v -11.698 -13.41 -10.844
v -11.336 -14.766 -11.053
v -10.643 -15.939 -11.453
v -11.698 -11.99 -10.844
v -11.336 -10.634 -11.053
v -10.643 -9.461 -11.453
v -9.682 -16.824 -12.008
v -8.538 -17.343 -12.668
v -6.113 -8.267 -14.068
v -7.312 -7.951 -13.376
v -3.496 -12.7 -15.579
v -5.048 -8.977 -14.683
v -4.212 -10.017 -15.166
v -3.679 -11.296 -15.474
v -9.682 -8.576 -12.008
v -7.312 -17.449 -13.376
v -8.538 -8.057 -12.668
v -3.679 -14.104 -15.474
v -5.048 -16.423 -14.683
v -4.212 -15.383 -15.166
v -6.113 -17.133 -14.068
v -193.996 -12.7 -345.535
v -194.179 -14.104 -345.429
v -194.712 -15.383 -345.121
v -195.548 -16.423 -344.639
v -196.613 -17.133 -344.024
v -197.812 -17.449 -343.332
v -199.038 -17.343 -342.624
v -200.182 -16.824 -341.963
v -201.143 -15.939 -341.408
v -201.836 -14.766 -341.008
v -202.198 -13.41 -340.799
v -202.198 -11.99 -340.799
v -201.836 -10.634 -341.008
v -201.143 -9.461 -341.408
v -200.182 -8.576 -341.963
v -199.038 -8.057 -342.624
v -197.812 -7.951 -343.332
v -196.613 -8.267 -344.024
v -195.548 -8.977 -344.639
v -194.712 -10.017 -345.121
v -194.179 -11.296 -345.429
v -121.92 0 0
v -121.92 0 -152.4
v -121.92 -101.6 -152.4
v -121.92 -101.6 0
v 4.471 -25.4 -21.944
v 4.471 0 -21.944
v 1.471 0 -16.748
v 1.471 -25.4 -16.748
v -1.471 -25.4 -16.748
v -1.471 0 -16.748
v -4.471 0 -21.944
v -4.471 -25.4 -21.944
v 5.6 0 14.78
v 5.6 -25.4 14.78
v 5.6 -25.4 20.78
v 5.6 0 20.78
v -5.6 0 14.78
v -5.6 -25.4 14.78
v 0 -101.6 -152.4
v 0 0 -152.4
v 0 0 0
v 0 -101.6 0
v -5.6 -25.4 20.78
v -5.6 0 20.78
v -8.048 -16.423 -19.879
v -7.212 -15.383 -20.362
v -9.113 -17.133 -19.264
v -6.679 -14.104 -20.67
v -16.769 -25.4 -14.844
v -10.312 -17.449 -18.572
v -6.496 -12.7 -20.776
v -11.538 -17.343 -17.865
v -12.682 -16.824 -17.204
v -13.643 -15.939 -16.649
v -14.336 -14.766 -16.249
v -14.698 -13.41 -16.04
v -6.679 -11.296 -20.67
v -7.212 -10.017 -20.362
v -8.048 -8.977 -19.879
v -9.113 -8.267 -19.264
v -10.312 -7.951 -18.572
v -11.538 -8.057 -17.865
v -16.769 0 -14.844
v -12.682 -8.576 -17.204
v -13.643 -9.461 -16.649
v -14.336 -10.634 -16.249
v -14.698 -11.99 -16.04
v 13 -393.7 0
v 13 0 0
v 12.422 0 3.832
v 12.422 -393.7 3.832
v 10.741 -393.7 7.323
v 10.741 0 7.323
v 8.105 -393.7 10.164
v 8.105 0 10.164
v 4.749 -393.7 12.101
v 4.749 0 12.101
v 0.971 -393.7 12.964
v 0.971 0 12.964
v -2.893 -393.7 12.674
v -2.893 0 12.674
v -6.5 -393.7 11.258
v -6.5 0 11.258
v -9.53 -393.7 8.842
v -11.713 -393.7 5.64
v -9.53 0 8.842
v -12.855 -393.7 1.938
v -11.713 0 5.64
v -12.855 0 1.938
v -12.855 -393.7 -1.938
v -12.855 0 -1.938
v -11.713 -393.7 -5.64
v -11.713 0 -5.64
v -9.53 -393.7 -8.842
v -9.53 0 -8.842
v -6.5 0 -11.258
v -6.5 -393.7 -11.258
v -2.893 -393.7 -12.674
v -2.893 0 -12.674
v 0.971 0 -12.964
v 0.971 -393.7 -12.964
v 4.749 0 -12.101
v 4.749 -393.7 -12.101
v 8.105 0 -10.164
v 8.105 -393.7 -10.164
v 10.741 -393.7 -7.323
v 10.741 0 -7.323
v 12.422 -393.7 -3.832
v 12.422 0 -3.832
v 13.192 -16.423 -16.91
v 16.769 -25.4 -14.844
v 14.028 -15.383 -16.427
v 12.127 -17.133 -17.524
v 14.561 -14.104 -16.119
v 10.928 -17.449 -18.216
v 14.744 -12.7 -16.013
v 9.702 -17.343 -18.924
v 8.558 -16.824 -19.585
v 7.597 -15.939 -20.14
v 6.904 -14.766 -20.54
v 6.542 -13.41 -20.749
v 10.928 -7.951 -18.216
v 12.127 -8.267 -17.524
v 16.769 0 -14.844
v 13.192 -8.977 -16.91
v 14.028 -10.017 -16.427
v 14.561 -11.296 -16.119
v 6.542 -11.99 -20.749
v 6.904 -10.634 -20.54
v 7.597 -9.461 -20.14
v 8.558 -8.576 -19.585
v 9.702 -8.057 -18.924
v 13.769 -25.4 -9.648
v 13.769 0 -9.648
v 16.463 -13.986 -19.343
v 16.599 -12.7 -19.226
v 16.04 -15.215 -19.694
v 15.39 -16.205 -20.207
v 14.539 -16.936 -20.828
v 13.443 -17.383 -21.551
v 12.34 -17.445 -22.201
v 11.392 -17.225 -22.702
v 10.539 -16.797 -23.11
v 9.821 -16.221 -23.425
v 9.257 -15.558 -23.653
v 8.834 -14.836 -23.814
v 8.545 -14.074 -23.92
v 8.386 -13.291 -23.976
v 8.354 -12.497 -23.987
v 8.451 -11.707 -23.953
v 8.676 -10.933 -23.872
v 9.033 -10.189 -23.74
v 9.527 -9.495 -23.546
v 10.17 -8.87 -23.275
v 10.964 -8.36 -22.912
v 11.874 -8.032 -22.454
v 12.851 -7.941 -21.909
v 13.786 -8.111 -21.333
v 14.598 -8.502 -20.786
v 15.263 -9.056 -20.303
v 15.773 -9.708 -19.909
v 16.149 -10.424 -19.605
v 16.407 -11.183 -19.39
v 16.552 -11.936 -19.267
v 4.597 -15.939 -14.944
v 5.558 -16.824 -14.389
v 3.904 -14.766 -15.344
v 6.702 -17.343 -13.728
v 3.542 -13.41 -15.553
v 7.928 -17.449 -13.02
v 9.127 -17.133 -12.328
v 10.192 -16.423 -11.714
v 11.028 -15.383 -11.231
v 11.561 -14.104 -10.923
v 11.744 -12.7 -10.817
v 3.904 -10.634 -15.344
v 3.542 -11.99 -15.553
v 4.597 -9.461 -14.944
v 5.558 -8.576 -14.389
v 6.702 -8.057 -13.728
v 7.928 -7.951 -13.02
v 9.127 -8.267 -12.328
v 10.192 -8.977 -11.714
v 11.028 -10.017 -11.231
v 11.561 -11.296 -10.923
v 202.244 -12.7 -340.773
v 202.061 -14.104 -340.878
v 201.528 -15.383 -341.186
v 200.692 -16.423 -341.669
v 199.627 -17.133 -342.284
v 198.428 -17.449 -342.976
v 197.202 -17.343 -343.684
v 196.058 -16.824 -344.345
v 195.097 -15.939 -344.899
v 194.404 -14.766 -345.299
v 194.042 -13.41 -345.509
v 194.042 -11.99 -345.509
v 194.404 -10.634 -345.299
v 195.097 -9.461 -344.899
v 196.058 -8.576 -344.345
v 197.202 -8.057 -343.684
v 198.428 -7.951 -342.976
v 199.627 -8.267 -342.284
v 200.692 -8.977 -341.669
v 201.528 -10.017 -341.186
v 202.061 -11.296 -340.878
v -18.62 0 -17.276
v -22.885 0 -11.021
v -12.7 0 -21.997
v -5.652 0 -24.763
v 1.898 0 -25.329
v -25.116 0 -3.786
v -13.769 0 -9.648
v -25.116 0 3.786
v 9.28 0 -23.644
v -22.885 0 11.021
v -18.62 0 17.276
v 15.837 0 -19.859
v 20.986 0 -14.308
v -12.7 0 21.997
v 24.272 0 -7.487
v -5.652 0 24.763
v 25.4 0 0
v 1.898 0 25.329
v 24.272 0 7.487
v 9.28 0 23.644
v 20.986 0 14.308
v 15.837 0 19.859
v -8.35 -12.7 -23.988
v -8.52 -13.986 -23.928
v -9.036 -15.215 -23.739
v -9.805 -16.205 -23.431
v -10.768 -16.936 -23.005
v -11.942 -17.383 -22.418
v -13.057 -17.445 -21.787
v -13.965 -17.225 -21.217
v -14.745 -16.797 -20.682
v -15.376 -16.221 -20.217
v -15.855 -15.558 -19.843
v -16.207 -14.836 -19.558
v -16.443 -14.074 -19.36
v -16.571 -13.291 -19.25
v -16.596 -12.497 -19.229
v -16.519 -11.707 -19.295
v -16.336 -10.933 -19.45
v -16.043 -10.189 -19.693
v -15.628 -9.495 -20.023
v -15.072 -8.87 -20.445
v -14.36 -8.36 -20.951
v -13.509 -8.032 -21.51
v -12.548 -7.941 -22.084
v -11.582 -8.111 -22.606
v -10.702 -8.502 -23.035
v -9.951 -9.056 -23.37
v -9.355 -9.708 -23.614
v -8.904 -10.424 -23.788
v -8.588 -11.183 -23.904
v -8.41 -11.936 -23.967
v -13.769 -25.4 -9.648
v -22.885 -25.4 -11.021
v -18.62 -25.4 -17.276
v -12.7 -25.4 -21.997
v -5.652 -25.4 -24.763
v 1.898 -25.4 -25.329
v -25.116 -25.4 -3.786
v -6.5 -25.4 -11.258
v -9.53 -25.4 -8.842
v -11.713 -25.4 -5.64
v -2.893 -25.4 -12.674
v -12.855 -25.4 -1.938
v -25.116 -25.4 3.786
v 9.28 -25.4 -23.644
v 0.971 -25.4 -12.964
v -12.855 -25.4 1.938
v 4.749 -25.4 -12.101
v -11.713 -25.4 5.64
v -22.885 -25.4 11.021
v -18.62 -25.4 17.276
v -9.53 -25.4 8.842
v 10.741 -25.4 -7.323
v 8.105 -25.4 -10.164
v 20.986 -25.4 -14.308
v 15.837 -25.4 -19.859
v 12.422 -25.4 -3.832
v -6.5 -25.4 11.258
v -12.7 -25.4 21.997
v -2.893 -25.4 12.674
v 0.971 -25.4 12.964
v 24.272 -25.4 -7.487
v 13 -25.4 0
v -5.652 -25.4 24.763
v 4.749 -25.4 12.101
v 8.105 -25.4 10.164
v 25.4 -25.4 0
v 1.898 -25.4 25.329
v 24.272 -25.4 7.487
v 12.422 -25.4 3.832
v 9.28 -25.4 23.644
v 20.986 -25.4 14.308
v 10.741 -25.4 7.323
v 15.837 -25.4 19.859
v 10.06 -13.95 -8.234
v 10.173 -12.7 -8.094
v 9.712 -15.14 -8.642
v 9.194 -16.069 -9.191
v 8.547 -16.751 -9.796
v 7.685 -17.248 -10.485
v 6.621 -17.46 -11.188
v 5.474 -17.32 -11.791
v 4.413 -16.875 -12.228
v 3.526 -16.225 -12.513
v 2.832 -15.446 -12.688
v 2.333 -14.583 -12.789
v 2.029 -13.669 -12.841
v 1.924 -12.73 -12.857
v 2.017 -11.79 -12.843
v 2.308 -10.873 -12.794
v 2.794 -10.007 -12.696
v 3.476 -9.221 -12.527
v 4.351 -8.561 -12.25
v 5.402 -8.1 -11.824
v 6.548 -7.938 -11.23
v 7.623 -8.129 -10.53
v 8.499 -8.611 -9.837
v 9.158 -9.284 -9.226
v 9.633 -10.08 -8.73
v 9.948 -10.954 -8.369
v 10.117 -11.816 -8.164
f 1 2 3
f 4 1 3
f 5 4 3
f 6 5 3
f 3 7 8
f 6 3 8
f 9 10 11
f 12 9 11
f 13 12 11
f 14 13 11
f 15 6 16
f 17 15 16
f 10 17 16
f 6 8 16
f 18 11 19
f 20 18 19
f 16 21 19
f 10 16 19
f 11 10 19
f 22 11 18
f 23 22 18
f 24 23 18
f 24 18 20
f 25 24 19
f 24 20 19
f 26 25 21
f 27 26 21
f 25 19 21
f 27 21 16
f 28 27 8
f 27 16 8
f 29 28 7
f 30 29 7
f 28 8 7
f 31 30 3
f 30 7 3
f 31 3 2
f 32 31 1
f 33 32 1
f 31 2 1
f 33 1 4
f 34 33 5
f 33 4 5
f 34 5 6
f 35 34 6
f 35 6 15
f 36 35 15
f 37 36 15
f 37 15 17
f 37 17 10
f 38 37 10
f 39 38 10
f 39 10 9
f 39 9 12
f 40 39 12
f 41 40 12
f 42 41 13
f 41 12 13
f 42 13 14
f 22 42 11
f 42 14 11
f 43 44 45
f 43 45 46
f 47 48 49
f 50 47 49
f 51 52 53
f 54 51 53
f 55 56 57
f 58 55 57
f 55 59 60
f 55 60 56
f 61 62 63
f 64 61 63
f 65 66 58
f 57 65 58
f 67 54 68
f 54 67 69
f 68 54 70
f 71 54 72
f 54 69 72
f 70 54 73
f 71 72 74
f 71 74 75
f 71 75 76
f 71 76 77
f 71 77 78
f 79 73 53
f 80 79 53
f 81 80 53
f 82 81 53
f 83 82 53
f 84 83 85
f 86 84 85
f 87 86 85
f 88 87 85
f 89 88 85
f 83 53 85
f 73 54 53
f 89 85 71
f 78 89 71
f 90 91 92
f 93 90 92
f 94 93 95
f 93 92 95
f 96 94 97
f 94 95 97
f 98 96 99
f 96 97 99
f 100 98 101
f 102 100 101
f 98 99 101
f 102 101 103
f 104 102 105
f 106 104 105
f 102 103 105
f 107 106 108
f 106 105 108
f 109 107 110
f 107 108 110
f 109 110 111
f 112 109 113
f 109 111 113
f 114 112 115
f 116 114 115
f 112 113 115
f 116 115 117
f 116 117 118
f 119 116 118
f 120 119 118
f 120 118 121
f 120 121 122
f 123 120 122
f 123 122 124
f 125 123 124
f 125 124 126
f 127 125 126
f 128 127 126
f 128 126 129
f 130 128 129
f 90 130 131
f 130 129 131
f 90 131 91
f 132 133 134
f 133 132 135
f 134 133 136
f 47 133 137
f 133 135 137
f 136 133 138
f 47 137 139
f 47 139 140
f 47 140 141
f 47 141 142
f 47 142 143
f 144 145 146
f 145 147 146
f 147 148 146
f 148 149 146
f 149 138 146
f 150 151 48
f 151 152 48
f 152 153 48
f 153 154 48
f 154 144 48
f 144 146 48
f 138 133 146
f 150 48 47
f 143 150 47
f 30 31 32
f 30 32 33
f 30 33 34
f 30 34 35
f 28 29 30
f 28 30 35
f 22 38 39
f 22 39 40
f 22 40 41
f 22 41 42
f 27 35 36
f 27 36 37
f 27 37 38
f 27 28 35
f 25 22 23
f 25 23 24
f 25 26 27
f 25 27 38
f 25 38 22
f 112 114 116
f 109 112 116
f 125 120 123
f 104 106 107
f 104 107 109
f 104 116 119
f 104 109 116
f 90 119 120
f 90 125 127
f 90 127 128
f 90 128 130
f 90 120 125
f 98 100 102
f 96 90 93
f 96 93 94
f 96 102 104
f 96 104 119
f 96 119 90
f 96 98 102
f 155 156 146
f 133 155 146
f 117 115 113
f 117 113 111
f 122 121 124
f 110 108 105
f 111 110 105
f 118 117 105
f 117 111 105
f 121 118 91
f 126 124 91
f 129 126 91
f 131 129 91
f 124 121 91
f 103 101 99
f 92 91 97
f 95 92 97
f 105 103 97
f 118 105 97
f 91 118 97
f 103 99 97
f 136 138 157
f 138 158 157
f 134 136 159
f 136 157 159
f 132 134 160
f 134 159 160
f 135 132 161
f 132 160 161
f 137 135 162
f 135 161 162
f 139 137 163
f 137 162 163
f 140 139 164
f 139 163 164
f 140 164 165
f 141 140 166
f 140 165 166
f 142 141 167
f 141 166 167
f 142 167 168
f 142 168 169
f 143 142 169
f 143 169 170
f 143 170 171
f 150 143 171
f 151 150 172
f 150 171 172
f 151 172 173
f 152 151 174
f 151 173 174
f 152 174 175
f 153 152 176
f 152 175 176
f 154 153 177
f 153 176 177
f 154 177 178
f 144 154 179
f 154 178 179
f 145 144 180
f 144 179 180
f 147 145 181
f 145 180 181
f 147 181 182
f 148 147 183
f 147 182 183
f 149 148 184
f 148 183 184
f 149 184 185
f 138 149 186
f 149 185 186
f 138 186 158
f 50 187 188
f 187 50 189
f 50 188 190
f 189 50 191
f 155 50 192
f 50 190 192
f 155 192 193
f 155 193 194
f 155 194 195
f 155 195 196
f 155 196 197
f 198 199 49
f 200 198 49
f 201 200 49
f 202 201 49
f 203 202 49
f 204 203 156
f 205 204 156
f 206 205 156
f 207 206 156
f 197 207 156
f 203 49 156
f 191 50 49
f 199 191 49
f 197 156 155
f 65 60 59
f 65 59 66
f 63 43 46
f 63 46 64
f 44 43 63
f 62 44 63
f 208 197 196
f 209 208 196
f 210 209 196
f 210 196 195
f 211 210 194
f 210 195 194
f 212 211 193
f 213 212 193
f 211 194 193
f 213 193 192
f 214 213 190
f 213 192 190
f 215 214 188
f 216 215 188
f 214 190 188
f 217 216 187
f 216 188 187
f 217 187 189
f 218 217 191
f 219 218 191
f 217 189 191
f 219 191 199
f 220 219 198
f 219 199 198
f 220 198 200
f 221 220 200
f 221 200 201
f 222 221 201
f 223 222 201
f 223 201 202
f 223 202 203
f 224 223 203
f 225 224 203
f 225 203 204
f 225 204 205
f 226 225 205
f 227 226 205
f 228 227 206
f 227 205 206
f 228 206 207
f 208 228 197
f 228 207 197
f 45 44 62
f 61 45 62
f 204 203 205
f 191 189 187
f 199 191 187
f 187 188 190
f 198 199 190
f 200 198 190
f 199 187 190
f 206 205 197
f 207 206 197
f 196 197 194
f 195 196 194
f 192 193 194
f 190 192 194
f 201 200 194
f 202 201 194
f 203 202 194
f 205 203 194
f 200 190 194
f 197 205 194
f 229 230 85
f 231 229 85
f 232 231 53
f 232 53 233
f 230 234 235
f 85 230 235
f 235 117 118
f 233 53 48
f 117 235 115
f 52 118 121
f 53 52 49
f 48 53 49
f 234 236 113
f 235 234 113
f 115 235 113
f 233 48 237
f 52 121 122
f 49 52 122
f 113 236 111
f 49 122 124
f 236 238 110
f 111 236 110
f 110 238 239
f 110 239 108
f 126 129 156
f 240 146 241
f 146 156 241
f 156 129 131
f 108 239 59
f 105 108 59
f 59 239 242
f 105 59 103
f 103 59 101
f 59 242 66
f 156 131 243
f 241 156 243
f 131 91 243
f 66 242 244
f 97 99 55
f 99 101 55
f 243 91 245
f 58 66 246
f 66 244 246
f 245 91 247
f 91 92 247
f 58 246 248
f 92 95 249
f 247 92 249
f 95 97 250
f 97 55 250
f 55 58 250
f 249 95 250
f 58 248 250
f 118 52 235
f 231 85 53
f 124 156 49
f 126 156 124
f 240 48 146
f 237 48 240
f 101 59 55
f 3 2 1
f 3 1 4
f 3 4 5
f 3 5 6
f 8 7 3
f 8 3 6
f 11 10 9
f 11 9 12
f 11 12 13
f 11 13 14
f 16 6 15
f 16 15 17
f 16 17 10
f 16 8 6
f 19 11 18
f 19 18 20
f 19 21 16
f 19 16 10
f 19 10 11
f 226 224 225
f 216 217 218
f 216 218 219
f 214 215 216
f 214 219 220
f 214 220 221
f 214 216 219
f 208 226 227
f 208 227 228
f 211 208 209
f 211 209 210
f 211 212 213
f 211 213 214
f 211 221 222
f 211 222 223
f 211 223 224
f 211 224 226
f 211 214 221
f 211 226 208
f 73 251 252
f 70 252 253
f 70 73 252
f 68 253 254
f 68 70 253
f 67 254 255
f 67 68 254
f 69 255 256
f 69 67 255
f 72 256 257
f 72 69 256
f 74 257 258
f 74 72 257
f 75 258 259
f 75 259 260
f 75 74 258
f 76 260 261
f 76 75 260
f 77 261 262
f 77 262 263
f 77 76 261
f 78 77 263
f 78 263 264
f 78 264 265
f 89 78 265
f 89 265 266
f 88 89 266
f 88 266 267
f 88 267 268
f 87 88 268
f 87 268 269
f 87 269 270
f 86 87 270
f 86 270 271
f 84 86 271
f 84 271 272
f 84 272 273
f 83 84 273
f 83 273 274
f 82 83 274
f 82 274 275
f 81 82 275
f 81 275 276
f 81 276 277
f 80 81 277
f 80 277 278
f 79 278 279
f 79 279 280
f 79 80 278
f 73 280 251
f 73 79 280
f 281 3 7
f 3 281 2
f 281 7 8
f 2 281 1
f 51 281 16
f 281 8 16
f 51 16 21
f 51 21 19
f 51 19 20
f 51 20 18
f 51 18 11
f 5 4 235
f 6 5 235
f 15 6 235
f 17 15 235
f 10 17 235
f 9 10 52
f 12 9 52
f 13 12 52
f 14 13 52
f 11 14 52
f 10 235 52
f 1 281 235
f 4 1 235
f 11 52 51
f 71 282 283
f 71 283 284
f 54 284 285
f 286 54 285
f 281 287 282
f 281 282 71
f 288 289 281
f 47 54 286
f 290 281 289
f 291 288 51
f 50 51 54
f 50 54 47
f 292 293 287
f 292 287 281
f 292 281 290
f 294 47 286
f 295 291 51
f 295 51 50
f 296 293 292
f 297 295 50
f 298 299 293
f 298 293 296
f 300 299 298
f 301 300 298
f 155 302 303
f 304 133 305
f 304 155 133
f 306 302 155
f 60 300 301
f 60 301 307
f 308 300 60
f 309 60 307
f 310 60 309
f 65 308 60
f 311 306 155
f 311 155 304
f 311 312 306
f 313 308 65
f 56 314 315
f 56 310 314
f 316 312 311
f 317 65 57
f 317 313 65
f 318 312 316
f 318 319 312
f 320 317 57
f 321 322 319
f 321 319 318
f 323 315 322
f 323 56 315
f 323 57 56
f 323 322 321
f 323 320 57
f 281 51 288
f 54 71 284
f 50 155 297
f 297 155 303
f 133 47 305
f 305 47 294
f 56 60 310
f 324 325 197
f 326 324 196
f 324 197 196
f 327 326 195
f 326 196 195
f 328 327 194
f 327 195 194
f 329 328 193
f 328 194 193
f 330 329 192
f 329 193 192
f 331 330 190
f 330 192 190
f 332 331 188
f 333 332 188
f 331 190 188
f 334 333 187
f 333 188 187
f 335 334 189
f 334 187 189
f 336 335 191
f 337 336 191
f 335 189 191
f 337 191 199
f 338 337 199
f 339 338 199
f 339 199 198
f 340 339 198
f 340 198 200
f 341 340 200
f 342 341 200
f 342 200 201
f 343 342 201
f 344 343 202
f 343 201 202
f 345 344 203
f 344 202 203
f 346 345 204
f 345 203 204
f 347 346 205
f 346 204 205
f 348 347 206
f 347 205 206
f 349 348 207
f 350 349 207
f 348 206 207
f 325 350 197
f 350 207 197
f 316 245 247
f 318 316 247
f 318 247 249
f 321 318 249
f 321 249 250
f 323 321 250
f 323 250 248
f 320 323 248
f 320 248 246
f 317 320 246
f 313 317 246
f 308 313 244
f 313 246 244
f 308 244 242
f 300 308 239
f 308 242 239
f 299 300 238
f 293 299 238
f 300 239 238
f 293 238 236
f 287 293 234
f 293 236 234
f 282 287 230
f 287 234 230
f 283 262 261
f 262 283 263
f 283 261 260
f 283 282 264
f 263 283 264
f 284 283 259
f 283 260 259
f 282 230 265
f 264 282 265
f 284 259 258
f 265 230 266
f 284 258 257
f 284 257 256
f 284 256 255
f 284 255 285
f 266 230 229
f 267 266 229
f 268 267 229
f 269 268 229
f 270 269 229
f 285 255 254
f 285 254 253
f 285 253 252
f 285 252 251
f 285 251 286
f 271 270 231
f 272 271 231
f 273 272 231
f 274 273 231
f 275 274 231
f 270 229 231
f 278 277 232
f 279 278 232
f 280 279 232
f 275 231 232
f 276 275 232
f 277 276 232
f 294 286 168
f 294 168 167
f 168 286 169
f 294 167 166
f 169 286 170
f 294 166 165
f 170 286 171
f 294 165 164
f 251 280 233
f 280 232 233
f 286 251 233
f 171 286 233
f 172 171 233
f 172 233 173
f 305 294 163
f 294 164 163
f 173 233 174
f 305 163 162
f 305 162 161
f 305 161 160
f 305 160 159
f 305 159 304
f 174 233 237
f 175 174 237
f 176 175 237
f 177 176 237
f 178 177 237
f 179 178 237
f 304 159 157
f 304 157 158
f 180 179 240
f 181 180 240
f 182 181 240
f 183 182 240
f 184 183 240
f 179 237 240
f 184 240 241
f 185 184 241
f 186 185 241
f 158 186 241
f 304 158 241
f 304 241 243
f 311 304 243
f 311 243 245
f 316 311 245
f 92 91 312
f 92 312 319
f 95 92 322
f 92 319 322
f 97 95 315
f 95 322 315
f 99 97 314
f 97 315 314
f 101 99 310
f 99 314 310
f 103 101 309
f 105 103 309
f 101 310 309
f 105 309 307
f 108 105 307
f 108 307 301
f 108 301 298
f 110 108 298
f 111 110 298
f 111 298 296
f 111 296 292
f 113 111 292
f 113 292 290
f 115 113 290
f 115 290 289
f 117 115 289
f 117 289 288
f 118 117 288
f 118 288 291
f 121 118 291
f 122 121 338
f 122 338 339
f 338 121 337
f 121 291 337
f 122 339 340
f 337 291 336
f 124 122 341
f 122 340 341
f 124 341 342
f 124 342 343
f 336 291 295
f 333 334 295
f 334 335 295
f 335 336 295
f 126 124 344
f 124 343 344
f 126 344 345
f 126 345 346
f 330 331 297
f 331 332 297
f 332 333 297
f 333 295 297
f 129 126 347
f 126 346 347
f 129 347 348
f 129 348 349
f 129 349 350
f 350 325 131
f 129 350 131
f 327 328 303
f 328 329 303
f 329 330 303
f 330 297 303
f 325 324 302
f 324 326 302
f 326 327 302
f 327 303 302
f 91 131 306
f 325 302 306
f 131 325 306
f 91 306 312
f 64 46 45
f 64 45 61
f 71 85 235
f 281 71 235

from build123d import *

# Parameters (mm, degrees)
F0_R      = 13
F1_DEPTH  = 393.7
F2_R      = 25.4
F2_W      = 11.2
F2_H      = 6
F3_DEPTH  = 25.4
F4_DEPTH  = 393.7
F5_R      = 4.7625
F6_DEPTH  = 381
F7_DEPTH  = 12.7
F8_R      = 4.7625
F9_DEPTH  = 381
F10_DEPTH = 25.4
F11_W     = 121.92
F11_H     = 152.4
F12_DEPTH = 101.6


with BuildPart() as f1:
    # F0 (on Front) → F1 (new body)
    with BuildSketch(Plane.XZ):
        Circle(F0_R)
    extrude(amount=F1_DEPTH)


with BuildPart() as f3:
    # F2 (on Front) → F3 (new body)
    with BuildSketch(Plane.XZ):
        Circle(F2_R)
        Polygon((-1.4712196331, -16.7482271537), (-4.4712196331, -21.9443795764), (-16.7687803669, -14.8443795764), (-13.7687803669, -9.6482271537), (-7.62, -13.1982271537), align=None, mode=Mode.SUBTRACT)
        Polygon((13.7687803669, -9.6482271537), (16.7687803669, -14.8443795764), (4.4712196331, -21.9443795764), (1.4712196331, -16.7482271537), (7.62, -13.1982271537), align=None, mode=Mode.SUBTRACT)
        with Locations((0, 17.78)):
            Rectangle(F2_W, F2_H, mode=Mode.SUBTRACT)
    extrude(amount=F3_DEPTH)

    # F4 (cut): a face of the model
    f4_faces = [f1.part.faces().sort_by_distance(p)[0] for p in [
        (0, -393.7, 0),
    ]]
    extrude(f4_faces, amount=-F4_DEPTH, mode=Mode.SUBTRACT)

    # F5 (on face) → F7 (cut, symmetric)
    with BuildSketch(Plane(origin=(7.62, 0, -13.1982271537), x_dir=(0.8660254038, 0, 0.5), z_dir=(0.5, 0, -0.8660254038))):
        with Locations((0, 12.7)):
            Circle(F5_R)
    extrude(amount=F7_DEPTH, both=True, mode=Mode.SUBTRACT)

    # F8 (on face) → F10 (cut)
    with BuildSketch(Plane(origin=(-7.62, 0, -13.1982271537), x_dir=(0.8660254038, 0, -0.5), z_dir=(-0.5, 0, -0.8660254038))):
        with Locations((0, 12.7)):
            Circle(F8_R)
    extrude(amount=F10_DEPTH, mode=Mode.SUBTRACT)


with BuildPart() as f6:
    # F5 (on face) → F6 (new body)
    with BuildSketch(Plane(origin=(7.62, 0, -13.1982271537), x_dir=(0.8660254038, 0, 0.5), z_dir=(0.5, 0, -0.8660254038))):
        with Locations((0, 12.7)):
            Circle(F5_R)
    extrude(amount=F6_DEPTH)


with BuildPart() as f9:
    # F8 (on face) → F9 (new body)
    with BuildSketch(Plane(origin=(-7.62, 0, -13.1982271537), x_dir=(0.8660254038, 0, -0.5), z_dir=(-0.5, 0, -0.8660254038))):
        with Locations((0, 12.7)):
            Circle(F8_R)
    extrude(amount=F9_DEPTH)


with BuildPart() as f12:
    # F11 (on Front) → F12 (new body)
    with BuildSketch(Plane.XZ):
        with Locations((-60.96, -76.2)):
            Rectangle(F11_W, F11_H)
    extrude(amount=F12_DEPTH)


solid = Compound([f1.part, f3.part, f6.part, f9.part, f12.part])
